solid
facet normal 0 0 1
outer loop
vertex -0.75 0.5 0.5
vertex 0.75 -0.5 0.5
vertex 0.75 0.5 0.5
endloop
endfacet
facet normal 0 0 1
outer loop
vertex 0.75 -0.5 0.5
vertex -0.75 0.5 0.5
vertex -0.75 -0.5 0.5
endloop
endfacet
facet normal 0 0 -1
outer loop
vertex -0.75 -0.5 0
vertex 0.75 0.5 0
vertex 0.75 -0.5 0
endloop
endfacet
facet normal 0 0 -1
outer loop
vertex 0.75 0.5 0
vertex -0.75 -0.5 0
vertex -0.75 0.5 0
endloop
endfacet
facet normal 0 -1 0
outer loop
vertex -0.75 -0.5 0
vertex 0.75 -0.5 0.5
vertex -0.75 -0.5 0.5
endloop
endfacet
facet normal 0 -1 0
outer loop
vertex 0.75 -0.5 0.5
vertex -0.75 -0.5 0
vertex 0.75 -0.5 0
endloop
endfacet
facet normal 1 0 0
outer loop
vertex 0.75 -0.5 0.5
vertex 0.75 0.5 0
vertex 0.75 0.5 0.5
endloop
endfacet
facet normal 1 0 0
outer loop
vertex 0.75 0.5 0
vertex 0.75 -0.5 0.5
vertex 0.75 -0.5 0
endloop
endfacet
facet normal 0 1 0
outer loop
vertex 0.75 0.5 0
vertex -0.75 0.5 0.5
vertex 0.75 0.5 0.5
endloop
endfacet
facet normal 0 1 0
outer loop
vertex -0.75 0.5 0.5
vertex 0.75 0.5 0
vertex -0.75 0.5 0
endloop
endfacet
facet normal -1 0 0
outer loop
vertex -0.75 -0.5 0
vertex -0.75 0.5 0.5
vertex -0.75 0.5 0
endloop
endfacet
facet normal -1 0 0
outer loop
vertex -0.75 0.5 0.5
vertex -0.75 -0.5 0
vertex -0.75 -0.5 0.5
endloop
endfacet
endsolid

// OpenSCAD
// file: ../config.scad
$fn = 200;
nothing = 0.01;

/*
 * CANtact PCB properties
 */
pcb_x = 61;
pcb_y = 36;
pcb_thickness = 1;
pcb_bottom_layer_parts_height = 3;
pcb_top_layer_parts_height = 12.5 + 1;

pcb_hole1_x = 25.5;
pcb_hole1_y = 4;

pcb_hole2_x = 57.5;
pcb_hole2_y = 28;

led1_x = 33.5;
led1_y = 4.5;

led2_x = 35.5;
led2_y = led1_y;

led_size_x = 1.5;
led_size_y = 1;
led_size_z = 0.5;

/*
 * Case properties
 */
wall_thickness = 2;
pcb_screw_terminal_outer_diameter = 4.5;
pcb_screw_terminal_inner_diameter = 1.5;
pcb_support_diameter = 3;

pcb_support1_x = 15.5;
pcb_support1_y = pcb_hole2_y - 1;

pcb_support2_x = 54;
pcb_support2_y = 8;

dsub_cutout_y = 30.5 + 1;
dsub_cutout_z = 12.5 + 1;
dsub_cutout_offset_y = 3 - 0.5;
dsub_cutout_offset_z = -0.5;

usb_cutout_y = 12 + 1; // + 0.5
usb_cutout_z = 10.5 + 0.5;
usb_cutout_offset_y = 3 - 0.25;
usb_cutout_offset_z = 0 - 0.25;

side_screw_support_x = 34;
side_screw_support_size_x = 5.5;
side_screw_support_size_y = 3.5;

side_screw_terminal_x = side_screw_support_x;
side_screw_terminal_z = 5;
side_screw_terminal_diameter = 1.5;

lid_border_inset = 1;
lid_border_width = 1.5;

led_window_size_x = 6;
led_window_size_y = 2.5;

/*
 * How much to increase x and y,
 * respectively width and length
 * compared to the PCB size
 */
expansion_x = 1;
expansion_y = 1;
expansion_z = 0;

/*
 * Derivative case measures
 */
// True dimensions of the case (bottom piece + lid)
case_x = pcb_x + expansion_x + 2*wall_thickness;
case_y = pcb_y + expansion_y + 2*wall_thickness;
case_z = pcb_thickness + pcb_top_layer_parts_height + pcb_bottom_layer_parts_height + expansion_z + 2*wall_thickness;
 
// How much the origin of the case (i.e. bottom piece) model
// is shifted compared to the PCB's origin
case_offset_x = -expansion_x/2 - wall_thickness;
case_offset_y = -expansion_y/2 - wall_thickness;
case_offset_z = -wall_thickness - pcb_thickness - expansion_z/2 - pcb_bottom_layer_parts_height;

bottom_piece_height = case_z; // - wall_thickness;

side_screw_support_size_z = bottom_piece_height + case_offset_z;

led_window_x = (led1_x + led2_x)/2 - led_window_size_x/2;
led_window_y = led1_y - led_window_size_y/2;
// main file
include <../config.scad>;

module smd_led()
{
    translate([
        -led_size_x/2,
        -led_size_y/2,
        0
        ])
    cube([
        led_size_x,
        led_size_y,
        led_size_z
        ]);
}

smd_led();
